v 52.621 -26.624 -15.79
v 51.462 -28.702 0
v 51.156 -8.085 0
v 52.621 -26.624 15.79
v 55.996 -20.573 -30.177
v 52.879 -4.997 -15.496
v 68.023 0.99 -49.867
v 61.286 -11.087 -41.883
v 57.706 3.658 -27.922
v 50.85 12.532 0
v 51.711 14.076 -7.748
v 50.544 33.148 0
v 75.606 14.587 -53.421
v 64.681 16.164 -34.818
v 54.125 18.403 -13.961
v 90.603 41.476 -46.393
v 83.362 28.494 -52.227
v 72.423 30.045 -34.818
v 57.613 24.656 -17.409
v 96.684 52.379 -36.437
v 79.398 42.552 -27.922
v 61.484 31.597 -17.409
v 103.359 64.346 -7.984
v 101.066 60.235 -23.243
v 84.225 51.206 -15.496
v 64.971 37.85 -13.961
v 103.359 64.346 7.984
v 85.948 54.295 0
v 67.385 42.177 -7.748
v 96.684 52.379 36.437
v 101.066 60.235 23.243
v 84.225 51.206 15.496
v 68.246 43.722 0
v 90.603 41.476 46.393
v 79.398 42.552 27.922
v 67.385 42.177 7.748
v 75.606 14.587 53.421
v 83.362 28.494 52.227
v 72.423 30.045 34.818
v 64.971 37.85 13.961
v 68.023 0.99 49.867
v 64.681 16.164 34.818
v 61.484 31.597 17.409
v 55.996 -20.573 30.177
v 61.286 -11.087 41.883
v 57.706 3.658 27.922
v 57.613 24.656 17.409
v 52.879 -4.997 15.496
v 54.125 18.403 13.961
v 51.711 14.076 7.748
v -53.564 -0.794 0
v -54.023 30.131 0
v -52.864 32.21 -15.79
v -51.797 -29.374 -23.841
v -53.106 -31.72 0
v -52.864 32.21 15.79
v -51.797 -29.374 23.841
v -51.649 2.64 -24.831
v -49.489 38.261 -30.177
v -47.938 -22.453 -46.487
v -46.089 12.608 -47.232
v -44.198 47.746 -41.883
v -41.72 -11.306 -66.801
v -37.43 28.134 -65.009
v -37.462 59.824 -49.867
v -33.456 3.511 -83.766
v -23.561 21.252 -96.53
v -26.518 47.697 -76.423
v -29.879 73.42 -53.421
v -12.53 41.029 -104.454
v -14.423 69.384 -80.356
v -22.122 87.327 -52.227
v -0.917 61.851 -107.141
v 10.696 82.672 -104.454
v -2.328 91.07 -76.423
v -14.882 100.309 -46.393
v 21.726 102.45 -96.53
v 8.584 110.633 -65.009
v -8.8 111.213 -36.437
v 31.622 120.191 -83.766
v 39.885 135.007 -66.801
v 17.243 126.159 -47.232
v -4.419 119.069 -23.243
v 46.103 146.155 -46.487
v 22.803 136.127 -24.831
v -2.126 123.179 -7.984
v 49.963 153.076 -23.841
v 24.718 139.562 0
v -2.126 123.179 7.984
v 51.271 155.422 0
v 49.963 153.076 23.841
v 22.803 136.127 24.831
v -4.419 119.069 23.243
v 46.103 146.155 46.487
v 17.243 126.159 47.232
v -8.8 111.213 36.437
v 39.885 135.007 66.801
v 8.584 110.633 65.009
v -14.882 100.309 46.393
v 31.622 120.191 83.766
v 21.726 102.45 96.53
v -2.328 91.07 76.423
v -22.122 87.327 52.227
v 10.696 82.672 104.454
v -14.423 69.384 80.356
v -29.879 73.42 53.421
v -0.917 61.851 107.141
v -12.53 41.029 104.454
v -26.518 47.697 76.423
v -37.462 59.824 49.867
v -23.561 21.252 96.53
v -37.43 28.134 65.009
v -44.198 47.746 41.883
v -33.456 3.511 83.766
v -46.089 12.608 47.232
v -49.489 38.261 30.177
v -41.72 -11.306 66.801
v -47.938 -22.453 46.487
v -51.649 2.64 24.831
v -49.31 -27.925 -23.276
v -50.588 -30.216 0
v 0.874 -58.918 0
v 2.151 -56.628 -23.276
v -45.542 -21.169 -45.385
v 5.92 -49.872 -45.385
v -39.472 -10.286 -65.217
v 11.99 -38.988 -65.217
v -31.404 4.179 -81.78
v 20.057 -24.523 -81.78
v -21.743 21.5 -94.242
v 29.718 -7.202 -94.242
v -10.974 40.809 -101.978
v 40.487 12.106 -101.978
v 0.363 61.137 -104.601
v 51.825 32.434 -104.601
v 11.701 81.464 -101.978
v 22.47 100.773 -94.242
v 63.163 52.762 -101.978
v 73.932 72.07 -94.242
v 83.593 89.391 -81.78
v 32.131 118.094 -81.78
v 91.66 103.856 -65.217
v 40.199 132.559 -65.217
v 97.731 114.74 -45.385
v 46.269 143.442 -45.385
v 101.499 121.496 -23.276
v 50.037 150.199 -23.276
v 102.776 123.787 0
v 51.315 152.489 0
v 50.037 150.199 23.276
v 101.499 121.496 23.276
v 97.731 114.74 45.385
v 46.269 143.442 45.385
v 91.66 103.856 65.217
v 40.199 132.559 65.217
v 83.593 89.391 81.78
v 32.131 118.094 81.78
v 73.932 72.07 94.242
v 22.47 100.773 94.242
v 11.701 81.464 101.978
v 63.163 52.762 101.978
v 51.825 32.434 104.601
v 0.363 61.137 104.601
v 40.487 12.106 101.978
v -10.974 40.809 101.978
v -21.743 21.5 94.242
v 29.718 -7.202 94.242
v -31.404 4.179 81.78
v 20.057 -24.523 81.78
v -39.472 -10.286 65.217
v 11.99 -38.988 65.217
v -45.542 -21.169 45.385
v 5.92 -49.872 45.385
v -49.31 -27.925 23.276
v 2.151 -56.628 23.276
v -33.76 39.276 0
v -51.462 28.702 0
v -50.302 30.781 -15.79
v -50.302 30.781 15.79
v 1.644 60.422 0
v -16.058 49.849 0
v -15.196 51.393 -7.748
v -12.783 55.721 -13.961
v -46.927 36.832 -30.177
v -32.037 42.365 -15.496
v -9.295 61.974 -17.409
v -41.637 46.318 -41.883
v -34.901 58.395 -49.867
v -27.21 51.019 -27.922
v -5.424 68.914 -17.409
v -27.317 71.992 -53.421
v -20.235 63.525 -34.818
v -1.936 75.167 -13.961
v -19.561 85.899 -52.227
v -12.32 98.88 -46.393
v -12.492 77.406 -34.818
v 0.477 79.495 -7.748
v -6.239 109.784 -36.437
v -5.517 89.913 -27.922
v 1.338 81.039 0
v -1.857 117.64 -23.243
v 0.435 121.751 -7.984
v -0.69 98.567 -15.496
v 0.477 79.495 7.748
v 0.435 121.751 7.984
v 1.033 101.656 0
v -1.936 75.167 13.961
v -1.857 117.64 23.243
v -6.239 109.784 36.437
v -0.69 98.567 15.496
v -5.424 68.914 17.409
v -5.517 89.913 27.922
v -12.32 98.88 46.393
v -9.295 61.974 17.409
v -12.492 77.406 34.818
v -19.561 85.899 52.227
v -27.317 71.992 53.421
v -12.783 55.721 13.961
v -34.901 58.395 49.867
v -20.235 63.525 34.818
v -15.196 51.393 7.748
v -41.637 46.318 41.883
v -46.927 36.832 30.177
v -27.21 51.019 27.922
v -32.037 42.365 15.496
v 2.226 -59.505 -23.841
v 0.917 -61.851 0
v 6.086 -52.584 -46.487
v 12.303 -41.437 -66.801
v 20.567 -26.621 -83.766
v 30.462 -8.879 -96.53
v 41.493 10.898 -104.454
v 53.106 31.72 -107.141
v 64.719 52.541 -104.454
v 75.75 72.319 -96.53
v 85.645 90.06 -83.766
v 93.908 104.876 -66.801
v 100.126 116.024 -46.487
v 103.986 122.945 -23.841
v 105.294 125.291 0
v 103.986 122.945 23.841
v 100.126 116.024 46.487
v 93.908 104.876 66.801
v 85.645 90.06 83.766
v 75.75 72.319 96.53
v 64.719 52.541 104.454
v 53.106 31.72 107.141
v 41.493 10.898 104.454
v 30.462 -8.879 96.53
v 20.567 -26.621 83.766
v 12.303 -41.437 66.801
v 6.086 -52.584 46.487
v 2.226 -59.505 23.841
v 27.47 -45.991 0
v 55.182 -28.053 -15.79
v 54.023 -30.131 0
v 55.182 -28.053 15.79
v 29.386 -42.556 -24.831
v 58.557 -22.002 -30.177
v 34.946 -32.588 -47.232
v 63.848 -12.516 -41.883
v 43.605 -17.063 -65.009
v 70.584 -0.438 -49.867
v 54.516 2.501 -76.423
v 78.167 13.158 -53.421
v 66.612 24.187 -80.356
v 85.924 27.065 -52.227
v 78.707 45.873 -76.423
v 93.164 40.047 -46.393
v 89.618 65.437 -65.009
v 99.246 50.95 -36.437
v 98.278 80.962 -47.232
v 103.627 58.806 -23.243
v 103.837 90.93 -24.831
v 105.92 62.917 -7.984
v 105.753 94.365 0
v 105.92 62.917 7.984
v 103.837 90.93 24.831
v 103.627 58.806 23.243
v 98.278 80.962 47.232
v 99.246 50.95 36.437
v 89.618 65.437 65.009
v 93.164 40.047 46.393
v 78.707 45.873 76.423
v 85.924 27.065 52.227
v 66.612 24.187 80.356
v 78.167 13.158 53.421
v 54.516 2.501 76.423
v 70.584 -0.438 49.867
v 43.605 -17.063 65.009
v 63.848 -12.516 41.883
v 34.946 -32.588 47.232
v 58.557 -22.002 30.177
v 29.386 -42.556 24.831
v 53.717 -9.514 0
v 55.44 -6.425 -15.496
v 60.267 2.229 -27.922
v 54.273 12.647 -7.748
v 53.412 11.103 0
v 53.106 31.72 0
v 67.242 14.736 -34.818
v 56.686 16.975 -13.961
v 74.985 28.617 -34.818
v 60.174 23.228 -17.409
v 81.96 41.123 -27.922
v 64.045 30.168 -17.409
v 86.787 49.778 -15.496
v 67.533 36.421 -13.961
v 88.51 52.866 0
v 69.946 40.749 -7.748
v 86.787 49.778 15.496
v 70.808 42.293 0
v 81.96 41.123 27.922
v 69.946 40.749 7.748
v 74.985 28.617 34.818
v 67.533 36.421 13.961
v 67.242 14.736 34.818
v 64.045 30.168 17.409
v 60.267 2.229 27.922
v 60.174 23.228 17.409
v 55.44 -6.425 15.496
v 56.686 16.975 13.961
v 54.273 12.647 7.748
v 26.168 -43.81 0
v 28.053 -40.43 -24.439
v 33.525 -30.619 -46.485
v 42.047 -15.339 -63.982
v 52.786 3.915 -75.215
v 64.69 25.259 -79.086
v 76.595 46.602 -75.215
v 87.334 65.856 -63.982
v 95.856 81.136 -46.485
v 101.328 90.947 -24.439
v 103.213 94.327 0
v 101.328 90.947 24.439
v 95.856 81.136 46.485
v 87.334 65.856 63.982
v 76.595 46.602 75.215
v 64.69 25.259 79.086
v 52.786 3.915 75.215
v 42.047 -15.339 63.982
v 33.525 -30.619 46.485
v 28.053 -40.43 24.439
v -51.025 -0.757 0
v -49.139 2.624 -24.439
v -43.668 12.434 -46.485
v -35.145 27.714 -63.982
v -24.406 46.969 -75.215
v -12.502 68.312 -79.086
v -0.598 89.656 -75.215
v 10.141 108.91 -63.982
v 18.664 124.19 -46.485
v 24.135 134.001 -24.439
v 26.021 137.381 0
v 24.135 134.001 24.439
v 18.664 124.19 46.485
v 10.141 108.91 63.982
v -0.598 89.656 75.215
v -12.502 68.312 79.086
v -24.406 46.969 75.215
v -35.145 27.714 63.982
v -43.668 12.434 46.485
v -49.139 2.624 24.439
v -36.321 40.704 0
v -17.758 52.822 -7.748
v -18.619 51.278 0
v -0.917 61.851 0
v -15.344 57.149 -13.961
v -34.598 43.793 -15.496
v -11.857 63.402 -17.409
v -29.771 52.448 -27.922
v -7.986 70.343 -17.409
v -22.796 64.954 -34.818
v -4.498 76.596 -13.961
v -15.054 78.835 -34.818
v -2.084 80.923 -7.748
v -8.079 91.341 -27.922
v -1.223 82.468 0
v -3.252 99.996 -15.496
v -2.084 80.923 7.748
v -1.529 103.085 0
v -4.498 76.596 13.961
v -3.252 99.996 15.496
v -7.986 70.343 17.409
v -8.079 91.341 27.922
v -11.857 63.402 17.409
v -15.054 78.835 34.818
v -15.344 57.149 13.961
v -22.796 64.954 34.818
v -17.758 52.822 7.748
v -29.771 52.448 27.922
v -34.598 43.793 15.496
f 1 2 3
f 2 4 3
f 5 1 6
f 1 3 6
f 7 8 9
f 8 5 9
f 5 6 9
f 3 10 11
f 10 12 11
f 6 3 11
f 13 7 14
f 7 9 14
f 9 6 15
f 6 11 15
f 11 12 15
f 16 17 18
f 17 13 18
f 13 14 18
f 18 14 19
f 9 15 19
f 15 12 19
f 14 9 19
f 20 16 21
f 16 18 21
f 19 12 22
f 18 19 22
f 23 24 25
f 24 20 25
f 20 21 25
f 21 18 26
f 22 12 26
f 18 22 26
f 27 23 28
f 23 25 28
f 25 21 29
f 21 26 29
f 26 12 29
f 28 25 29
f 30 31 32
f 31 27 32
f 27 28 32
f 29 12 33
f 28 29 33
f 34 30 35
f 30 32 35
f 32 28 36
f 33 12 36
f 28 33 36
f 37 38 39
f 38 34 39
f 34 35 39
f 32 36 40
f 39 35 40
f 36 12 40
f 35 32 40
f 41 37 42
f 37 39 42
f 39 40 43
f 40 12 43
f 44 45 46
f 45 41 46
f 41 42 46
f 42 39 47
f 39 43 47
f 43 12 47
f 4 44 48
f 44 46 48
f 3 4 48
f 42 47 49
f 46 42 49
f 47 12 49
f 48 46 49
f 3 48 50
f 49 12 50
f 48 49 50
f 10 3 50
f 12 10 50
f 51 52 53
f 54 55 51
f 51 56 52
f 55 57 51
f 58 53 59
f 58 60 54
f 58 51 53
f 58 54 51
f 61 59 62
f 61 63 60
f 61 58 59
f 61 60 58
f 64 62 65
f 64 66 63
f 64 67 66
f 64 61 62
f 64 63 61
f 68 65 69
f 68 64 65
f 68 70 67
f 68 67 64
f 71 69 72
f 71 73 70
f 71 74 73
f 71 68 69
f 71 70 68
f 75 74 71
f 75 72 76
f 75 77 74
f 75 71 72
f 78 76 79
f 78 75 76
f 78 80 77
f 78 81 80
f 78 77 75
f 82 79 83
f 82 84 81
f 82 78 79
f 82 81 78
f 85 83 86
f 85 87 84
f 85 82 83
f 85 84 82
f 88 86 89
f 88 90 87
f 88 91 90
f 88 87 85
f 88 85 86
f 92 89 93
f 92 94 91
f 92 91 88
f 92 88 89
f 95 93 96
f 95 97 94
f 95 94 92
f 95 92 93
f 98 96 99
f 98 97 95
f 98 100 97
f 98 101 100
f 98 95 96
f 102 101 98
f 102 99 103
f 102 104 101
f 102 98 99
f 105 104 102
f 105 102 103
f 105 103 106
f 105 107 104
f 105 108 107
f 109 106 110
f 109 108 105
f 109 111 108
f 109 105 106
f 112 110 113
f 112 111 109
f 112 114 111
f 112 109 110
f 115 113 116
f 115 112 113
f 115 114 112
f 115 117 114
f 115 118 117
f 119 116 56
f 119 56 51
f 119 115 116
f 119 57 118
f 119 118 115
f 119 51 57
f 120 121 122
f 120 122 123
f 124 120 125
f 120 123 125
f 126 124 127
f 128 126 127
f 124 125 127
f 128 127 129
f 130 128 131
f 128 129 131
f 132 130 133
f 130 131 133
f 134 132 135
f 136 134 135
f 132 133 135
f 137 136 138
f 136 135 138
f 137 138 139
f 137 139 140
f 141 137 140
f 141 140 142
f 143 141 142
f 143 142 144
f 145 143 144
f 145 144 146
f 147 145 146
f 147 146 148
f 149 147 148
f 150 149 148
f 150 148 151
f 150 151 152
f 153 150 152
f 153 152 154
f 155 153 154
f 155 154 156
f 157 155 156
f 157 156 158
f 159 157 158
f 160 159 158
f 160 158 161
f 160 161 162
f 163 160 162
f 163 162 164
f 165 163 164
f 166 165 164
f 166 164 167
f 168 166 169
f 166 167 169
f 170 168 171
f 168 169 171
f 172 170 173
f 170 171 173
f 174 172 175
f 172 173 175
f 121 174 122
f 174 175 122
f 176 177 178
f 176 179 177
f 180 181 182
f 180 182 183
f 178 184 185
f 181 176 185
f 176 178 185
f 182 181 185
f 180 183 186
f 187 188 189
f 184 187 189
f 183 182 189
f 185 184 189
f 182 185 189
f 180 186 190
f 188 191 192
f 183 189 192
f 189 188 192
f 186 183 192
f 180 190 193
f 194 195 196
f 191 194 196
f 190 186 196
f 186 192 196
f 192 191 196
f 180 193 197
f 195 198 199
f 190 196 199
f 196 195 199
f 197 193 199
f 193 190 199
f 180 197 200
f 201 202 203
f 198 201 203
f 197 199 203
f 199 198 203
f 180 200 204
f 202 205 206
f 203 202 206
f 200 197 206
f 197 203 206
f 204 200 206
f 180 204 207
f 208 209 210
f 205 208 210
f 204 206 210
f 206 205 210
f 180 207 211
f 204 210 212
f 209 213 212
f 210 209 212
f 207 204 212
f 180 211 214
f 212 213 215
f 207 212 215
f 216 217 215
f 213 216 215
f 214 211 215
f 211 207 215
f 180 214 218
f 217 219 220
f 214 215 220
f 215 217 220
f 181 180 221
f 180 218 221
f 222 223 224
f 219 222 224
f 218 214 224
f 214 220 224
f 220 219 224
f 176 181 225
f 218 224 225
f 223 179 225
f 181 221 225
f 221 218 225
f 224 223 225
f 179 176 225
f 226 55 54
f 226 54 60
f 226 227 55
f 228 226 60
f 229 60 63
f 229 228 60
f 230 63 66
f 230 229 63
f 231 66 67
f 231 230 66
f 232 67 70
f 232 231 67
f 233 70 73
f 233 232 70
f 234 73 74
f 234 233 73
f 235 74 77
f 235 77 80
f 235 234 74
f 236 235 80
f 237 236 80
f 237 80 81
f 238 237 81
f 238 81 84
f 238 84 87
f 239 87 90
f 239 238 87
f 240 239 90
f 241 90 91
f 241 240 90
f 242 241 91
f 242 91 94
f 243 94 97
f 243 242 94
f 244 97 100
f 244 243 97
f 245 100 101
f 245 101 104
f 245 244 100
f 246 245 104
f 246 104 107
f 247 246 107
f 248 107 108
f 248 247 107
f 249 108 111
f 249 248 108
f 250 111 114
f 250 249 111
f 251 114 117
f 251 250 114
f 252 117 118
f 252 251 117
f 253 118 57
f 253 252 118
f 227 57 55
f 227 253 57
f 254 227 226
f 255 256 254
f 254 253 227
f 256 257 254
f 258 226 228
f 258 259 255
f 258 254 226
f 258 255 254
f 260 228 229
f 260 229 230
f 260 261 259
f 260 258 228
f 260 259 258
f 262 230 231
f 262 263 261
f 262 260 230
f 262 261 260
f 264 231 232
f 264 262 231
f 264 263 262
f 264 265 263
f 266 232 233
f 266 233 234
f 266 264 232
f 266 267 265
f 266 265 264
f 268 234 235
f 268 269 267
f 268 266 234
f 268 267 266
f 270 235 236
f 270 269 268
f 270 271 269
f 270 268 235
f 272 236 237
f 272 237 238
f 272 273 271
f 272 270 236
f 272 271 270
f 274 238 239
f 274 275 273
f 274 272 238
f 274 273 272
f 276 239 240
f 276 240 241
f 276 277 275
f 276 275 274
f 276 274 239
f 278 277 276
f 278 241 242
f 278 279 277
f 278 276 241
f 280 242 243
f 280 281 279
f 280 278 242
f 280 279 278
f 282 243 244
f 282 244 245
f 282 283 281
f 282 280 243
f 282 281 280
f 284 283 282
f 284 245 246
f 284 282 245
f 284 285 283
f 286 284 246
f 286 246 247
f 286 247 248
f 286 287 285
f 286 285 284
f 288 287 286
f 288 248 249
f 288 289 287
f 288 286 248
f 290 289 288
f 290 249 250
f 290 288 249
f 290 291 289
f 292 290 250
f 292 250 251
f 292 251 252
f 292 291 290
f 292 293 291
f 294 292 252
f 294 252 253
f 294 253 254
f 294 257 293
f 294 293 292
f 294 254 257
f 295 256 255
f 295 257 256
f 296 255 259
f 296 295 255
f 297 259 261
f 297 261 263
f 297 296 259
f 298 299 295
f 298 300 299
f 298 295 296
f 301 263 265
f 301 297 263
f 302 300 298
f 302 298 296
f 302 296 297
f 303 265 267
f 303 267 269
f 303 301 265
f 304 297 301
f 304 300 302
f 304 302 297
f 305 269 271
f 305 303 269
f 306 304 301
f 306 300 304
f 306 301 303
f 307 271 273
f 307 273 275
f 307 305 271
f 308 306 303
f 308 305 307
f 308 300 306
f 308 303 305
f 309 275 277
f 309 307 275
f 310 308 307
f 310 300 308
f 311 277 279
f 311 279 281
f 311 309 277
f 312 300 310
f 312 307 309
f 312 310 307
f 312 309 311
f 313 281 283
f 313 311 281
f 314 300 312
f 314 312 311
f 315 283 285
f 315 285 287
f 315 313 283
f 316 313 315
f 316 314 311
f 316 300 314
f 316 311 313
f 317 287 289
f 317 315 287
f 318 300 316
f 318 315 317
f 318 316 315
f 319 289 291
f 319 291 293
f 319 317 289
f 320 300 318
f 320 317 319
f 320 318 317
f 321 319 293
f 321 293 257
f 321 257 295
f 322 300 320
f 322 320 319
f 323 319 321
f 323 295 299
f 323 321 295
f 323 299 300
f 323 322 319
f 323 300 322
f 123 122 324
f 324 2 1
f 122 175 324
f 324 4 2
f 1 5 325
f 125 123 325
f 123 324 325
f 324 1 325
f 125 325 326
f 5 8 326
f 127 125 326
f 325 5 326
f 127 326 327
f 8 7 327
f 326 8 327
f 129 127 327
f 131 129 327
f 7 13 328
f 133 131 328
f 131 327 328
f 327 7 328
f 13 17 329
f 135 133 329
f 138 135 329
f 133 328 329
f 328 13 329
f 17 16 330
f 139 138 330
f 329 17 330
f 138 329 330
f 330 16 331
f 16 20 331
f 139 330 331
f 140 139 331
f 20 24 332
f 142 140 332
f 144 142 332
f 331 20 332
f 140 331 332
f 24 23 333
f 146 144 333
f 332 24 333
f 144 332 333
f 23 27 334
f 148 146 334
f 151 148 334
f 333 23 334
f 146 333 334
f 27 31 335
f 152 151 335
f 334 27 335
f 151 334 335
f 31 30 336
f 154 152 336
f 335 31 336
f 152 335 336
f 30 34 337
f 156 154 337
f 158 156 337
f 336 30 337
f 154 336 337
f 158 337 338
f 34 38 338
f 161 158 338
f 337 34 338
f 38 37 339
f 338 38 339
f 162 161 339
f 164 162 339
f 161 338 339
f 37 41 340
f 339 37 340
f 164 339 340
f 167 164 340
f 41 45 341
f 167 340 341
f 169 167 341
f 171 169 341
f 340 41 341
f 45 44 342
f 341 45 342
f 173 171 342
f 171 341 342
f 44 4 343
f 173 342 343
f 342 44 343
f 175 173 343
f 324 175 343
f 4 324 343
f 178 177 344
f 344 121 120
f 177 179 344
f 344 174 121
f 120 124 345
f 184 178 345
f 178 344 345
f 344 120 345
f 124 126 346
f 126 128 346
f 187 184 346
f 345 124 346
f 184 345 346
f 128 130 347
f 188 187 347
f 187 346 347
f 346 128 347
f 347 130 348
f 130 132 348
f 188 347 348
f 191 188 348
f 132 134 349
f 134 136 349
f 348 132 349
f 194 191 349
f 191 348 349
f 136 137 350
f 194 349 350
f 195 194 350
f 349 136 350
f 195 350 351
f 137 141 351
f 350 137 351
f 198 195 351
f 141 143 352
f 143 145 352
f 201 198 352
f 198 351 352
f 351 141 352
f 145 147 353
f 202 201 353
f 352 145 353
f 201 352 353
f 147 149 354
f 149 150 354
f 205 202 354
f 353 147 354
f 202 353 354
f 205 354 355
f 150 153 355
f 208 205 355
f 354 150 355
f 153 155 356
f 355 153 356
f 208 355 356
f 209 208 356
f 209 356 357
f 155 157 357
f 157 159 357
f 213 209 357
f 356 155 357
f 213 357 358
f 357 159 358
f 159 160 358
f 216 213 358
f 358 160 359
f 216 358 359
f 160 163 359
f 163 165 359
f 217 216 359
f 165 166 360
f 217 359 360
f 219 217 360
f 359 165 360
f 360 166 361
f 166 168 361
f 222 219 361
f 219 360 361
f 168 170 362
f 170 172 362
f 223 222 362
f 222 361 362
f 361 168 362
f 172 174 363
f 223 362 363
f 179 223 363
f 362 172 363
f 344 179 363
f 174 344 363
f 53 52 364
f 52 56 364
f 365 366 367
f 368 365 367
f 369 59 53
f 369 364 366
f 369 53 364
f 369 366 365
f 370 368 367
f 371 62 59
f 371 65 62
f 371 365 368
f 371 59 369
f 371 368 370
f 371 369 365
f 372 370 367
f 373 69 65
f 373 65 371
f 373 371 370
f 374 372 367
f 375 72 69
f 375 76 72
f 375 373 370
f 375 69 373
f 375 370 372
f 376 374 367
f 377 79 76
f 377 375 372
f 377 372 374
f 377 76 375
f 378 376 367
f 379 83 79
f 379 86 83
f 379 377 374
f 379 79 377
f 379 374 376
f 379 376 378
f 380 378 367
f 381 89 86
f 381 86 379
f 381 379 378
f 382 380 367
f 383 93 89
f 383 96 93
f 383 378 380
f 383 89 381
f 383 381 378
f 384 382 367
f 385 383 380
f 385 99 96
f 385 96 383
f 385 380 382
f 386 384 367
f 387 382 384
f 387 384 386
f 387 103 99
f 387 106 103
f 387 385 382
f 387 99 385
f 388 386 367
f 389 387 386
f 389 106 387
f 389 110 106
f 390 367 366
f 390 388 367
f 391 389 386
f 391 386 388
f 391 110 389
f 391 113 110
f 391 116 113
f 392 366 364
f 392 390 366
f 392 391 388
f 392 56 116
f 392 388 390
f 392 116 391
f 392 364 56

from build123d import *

# Parameters (mm, degrees)
F2_T = -2.54


with BuildPart() as f1:
    # F0 (on Top) → F1 (revolve)
    with BuildSketch(Plane.XY):
        Polygon((-0.917275699, 61.8508926201), (-54.0230821053, 30.1310622525), (-53.1058064063, -31.7198303677), (0.917275699, -61.8508926201), (54.0230821053, -30.1310622525), (53.1058064063, 31.7198303677), align=None)
    revolve(axis=Axis((26.0942653536, 46.7853614939, 0), (0.8733445845, -0.4871029015, 0)))

    # F2 (hollow: no face is removed)
    offset(amount=F2_T, mode=Mode.SUBTRACT)


solid = f1.part
